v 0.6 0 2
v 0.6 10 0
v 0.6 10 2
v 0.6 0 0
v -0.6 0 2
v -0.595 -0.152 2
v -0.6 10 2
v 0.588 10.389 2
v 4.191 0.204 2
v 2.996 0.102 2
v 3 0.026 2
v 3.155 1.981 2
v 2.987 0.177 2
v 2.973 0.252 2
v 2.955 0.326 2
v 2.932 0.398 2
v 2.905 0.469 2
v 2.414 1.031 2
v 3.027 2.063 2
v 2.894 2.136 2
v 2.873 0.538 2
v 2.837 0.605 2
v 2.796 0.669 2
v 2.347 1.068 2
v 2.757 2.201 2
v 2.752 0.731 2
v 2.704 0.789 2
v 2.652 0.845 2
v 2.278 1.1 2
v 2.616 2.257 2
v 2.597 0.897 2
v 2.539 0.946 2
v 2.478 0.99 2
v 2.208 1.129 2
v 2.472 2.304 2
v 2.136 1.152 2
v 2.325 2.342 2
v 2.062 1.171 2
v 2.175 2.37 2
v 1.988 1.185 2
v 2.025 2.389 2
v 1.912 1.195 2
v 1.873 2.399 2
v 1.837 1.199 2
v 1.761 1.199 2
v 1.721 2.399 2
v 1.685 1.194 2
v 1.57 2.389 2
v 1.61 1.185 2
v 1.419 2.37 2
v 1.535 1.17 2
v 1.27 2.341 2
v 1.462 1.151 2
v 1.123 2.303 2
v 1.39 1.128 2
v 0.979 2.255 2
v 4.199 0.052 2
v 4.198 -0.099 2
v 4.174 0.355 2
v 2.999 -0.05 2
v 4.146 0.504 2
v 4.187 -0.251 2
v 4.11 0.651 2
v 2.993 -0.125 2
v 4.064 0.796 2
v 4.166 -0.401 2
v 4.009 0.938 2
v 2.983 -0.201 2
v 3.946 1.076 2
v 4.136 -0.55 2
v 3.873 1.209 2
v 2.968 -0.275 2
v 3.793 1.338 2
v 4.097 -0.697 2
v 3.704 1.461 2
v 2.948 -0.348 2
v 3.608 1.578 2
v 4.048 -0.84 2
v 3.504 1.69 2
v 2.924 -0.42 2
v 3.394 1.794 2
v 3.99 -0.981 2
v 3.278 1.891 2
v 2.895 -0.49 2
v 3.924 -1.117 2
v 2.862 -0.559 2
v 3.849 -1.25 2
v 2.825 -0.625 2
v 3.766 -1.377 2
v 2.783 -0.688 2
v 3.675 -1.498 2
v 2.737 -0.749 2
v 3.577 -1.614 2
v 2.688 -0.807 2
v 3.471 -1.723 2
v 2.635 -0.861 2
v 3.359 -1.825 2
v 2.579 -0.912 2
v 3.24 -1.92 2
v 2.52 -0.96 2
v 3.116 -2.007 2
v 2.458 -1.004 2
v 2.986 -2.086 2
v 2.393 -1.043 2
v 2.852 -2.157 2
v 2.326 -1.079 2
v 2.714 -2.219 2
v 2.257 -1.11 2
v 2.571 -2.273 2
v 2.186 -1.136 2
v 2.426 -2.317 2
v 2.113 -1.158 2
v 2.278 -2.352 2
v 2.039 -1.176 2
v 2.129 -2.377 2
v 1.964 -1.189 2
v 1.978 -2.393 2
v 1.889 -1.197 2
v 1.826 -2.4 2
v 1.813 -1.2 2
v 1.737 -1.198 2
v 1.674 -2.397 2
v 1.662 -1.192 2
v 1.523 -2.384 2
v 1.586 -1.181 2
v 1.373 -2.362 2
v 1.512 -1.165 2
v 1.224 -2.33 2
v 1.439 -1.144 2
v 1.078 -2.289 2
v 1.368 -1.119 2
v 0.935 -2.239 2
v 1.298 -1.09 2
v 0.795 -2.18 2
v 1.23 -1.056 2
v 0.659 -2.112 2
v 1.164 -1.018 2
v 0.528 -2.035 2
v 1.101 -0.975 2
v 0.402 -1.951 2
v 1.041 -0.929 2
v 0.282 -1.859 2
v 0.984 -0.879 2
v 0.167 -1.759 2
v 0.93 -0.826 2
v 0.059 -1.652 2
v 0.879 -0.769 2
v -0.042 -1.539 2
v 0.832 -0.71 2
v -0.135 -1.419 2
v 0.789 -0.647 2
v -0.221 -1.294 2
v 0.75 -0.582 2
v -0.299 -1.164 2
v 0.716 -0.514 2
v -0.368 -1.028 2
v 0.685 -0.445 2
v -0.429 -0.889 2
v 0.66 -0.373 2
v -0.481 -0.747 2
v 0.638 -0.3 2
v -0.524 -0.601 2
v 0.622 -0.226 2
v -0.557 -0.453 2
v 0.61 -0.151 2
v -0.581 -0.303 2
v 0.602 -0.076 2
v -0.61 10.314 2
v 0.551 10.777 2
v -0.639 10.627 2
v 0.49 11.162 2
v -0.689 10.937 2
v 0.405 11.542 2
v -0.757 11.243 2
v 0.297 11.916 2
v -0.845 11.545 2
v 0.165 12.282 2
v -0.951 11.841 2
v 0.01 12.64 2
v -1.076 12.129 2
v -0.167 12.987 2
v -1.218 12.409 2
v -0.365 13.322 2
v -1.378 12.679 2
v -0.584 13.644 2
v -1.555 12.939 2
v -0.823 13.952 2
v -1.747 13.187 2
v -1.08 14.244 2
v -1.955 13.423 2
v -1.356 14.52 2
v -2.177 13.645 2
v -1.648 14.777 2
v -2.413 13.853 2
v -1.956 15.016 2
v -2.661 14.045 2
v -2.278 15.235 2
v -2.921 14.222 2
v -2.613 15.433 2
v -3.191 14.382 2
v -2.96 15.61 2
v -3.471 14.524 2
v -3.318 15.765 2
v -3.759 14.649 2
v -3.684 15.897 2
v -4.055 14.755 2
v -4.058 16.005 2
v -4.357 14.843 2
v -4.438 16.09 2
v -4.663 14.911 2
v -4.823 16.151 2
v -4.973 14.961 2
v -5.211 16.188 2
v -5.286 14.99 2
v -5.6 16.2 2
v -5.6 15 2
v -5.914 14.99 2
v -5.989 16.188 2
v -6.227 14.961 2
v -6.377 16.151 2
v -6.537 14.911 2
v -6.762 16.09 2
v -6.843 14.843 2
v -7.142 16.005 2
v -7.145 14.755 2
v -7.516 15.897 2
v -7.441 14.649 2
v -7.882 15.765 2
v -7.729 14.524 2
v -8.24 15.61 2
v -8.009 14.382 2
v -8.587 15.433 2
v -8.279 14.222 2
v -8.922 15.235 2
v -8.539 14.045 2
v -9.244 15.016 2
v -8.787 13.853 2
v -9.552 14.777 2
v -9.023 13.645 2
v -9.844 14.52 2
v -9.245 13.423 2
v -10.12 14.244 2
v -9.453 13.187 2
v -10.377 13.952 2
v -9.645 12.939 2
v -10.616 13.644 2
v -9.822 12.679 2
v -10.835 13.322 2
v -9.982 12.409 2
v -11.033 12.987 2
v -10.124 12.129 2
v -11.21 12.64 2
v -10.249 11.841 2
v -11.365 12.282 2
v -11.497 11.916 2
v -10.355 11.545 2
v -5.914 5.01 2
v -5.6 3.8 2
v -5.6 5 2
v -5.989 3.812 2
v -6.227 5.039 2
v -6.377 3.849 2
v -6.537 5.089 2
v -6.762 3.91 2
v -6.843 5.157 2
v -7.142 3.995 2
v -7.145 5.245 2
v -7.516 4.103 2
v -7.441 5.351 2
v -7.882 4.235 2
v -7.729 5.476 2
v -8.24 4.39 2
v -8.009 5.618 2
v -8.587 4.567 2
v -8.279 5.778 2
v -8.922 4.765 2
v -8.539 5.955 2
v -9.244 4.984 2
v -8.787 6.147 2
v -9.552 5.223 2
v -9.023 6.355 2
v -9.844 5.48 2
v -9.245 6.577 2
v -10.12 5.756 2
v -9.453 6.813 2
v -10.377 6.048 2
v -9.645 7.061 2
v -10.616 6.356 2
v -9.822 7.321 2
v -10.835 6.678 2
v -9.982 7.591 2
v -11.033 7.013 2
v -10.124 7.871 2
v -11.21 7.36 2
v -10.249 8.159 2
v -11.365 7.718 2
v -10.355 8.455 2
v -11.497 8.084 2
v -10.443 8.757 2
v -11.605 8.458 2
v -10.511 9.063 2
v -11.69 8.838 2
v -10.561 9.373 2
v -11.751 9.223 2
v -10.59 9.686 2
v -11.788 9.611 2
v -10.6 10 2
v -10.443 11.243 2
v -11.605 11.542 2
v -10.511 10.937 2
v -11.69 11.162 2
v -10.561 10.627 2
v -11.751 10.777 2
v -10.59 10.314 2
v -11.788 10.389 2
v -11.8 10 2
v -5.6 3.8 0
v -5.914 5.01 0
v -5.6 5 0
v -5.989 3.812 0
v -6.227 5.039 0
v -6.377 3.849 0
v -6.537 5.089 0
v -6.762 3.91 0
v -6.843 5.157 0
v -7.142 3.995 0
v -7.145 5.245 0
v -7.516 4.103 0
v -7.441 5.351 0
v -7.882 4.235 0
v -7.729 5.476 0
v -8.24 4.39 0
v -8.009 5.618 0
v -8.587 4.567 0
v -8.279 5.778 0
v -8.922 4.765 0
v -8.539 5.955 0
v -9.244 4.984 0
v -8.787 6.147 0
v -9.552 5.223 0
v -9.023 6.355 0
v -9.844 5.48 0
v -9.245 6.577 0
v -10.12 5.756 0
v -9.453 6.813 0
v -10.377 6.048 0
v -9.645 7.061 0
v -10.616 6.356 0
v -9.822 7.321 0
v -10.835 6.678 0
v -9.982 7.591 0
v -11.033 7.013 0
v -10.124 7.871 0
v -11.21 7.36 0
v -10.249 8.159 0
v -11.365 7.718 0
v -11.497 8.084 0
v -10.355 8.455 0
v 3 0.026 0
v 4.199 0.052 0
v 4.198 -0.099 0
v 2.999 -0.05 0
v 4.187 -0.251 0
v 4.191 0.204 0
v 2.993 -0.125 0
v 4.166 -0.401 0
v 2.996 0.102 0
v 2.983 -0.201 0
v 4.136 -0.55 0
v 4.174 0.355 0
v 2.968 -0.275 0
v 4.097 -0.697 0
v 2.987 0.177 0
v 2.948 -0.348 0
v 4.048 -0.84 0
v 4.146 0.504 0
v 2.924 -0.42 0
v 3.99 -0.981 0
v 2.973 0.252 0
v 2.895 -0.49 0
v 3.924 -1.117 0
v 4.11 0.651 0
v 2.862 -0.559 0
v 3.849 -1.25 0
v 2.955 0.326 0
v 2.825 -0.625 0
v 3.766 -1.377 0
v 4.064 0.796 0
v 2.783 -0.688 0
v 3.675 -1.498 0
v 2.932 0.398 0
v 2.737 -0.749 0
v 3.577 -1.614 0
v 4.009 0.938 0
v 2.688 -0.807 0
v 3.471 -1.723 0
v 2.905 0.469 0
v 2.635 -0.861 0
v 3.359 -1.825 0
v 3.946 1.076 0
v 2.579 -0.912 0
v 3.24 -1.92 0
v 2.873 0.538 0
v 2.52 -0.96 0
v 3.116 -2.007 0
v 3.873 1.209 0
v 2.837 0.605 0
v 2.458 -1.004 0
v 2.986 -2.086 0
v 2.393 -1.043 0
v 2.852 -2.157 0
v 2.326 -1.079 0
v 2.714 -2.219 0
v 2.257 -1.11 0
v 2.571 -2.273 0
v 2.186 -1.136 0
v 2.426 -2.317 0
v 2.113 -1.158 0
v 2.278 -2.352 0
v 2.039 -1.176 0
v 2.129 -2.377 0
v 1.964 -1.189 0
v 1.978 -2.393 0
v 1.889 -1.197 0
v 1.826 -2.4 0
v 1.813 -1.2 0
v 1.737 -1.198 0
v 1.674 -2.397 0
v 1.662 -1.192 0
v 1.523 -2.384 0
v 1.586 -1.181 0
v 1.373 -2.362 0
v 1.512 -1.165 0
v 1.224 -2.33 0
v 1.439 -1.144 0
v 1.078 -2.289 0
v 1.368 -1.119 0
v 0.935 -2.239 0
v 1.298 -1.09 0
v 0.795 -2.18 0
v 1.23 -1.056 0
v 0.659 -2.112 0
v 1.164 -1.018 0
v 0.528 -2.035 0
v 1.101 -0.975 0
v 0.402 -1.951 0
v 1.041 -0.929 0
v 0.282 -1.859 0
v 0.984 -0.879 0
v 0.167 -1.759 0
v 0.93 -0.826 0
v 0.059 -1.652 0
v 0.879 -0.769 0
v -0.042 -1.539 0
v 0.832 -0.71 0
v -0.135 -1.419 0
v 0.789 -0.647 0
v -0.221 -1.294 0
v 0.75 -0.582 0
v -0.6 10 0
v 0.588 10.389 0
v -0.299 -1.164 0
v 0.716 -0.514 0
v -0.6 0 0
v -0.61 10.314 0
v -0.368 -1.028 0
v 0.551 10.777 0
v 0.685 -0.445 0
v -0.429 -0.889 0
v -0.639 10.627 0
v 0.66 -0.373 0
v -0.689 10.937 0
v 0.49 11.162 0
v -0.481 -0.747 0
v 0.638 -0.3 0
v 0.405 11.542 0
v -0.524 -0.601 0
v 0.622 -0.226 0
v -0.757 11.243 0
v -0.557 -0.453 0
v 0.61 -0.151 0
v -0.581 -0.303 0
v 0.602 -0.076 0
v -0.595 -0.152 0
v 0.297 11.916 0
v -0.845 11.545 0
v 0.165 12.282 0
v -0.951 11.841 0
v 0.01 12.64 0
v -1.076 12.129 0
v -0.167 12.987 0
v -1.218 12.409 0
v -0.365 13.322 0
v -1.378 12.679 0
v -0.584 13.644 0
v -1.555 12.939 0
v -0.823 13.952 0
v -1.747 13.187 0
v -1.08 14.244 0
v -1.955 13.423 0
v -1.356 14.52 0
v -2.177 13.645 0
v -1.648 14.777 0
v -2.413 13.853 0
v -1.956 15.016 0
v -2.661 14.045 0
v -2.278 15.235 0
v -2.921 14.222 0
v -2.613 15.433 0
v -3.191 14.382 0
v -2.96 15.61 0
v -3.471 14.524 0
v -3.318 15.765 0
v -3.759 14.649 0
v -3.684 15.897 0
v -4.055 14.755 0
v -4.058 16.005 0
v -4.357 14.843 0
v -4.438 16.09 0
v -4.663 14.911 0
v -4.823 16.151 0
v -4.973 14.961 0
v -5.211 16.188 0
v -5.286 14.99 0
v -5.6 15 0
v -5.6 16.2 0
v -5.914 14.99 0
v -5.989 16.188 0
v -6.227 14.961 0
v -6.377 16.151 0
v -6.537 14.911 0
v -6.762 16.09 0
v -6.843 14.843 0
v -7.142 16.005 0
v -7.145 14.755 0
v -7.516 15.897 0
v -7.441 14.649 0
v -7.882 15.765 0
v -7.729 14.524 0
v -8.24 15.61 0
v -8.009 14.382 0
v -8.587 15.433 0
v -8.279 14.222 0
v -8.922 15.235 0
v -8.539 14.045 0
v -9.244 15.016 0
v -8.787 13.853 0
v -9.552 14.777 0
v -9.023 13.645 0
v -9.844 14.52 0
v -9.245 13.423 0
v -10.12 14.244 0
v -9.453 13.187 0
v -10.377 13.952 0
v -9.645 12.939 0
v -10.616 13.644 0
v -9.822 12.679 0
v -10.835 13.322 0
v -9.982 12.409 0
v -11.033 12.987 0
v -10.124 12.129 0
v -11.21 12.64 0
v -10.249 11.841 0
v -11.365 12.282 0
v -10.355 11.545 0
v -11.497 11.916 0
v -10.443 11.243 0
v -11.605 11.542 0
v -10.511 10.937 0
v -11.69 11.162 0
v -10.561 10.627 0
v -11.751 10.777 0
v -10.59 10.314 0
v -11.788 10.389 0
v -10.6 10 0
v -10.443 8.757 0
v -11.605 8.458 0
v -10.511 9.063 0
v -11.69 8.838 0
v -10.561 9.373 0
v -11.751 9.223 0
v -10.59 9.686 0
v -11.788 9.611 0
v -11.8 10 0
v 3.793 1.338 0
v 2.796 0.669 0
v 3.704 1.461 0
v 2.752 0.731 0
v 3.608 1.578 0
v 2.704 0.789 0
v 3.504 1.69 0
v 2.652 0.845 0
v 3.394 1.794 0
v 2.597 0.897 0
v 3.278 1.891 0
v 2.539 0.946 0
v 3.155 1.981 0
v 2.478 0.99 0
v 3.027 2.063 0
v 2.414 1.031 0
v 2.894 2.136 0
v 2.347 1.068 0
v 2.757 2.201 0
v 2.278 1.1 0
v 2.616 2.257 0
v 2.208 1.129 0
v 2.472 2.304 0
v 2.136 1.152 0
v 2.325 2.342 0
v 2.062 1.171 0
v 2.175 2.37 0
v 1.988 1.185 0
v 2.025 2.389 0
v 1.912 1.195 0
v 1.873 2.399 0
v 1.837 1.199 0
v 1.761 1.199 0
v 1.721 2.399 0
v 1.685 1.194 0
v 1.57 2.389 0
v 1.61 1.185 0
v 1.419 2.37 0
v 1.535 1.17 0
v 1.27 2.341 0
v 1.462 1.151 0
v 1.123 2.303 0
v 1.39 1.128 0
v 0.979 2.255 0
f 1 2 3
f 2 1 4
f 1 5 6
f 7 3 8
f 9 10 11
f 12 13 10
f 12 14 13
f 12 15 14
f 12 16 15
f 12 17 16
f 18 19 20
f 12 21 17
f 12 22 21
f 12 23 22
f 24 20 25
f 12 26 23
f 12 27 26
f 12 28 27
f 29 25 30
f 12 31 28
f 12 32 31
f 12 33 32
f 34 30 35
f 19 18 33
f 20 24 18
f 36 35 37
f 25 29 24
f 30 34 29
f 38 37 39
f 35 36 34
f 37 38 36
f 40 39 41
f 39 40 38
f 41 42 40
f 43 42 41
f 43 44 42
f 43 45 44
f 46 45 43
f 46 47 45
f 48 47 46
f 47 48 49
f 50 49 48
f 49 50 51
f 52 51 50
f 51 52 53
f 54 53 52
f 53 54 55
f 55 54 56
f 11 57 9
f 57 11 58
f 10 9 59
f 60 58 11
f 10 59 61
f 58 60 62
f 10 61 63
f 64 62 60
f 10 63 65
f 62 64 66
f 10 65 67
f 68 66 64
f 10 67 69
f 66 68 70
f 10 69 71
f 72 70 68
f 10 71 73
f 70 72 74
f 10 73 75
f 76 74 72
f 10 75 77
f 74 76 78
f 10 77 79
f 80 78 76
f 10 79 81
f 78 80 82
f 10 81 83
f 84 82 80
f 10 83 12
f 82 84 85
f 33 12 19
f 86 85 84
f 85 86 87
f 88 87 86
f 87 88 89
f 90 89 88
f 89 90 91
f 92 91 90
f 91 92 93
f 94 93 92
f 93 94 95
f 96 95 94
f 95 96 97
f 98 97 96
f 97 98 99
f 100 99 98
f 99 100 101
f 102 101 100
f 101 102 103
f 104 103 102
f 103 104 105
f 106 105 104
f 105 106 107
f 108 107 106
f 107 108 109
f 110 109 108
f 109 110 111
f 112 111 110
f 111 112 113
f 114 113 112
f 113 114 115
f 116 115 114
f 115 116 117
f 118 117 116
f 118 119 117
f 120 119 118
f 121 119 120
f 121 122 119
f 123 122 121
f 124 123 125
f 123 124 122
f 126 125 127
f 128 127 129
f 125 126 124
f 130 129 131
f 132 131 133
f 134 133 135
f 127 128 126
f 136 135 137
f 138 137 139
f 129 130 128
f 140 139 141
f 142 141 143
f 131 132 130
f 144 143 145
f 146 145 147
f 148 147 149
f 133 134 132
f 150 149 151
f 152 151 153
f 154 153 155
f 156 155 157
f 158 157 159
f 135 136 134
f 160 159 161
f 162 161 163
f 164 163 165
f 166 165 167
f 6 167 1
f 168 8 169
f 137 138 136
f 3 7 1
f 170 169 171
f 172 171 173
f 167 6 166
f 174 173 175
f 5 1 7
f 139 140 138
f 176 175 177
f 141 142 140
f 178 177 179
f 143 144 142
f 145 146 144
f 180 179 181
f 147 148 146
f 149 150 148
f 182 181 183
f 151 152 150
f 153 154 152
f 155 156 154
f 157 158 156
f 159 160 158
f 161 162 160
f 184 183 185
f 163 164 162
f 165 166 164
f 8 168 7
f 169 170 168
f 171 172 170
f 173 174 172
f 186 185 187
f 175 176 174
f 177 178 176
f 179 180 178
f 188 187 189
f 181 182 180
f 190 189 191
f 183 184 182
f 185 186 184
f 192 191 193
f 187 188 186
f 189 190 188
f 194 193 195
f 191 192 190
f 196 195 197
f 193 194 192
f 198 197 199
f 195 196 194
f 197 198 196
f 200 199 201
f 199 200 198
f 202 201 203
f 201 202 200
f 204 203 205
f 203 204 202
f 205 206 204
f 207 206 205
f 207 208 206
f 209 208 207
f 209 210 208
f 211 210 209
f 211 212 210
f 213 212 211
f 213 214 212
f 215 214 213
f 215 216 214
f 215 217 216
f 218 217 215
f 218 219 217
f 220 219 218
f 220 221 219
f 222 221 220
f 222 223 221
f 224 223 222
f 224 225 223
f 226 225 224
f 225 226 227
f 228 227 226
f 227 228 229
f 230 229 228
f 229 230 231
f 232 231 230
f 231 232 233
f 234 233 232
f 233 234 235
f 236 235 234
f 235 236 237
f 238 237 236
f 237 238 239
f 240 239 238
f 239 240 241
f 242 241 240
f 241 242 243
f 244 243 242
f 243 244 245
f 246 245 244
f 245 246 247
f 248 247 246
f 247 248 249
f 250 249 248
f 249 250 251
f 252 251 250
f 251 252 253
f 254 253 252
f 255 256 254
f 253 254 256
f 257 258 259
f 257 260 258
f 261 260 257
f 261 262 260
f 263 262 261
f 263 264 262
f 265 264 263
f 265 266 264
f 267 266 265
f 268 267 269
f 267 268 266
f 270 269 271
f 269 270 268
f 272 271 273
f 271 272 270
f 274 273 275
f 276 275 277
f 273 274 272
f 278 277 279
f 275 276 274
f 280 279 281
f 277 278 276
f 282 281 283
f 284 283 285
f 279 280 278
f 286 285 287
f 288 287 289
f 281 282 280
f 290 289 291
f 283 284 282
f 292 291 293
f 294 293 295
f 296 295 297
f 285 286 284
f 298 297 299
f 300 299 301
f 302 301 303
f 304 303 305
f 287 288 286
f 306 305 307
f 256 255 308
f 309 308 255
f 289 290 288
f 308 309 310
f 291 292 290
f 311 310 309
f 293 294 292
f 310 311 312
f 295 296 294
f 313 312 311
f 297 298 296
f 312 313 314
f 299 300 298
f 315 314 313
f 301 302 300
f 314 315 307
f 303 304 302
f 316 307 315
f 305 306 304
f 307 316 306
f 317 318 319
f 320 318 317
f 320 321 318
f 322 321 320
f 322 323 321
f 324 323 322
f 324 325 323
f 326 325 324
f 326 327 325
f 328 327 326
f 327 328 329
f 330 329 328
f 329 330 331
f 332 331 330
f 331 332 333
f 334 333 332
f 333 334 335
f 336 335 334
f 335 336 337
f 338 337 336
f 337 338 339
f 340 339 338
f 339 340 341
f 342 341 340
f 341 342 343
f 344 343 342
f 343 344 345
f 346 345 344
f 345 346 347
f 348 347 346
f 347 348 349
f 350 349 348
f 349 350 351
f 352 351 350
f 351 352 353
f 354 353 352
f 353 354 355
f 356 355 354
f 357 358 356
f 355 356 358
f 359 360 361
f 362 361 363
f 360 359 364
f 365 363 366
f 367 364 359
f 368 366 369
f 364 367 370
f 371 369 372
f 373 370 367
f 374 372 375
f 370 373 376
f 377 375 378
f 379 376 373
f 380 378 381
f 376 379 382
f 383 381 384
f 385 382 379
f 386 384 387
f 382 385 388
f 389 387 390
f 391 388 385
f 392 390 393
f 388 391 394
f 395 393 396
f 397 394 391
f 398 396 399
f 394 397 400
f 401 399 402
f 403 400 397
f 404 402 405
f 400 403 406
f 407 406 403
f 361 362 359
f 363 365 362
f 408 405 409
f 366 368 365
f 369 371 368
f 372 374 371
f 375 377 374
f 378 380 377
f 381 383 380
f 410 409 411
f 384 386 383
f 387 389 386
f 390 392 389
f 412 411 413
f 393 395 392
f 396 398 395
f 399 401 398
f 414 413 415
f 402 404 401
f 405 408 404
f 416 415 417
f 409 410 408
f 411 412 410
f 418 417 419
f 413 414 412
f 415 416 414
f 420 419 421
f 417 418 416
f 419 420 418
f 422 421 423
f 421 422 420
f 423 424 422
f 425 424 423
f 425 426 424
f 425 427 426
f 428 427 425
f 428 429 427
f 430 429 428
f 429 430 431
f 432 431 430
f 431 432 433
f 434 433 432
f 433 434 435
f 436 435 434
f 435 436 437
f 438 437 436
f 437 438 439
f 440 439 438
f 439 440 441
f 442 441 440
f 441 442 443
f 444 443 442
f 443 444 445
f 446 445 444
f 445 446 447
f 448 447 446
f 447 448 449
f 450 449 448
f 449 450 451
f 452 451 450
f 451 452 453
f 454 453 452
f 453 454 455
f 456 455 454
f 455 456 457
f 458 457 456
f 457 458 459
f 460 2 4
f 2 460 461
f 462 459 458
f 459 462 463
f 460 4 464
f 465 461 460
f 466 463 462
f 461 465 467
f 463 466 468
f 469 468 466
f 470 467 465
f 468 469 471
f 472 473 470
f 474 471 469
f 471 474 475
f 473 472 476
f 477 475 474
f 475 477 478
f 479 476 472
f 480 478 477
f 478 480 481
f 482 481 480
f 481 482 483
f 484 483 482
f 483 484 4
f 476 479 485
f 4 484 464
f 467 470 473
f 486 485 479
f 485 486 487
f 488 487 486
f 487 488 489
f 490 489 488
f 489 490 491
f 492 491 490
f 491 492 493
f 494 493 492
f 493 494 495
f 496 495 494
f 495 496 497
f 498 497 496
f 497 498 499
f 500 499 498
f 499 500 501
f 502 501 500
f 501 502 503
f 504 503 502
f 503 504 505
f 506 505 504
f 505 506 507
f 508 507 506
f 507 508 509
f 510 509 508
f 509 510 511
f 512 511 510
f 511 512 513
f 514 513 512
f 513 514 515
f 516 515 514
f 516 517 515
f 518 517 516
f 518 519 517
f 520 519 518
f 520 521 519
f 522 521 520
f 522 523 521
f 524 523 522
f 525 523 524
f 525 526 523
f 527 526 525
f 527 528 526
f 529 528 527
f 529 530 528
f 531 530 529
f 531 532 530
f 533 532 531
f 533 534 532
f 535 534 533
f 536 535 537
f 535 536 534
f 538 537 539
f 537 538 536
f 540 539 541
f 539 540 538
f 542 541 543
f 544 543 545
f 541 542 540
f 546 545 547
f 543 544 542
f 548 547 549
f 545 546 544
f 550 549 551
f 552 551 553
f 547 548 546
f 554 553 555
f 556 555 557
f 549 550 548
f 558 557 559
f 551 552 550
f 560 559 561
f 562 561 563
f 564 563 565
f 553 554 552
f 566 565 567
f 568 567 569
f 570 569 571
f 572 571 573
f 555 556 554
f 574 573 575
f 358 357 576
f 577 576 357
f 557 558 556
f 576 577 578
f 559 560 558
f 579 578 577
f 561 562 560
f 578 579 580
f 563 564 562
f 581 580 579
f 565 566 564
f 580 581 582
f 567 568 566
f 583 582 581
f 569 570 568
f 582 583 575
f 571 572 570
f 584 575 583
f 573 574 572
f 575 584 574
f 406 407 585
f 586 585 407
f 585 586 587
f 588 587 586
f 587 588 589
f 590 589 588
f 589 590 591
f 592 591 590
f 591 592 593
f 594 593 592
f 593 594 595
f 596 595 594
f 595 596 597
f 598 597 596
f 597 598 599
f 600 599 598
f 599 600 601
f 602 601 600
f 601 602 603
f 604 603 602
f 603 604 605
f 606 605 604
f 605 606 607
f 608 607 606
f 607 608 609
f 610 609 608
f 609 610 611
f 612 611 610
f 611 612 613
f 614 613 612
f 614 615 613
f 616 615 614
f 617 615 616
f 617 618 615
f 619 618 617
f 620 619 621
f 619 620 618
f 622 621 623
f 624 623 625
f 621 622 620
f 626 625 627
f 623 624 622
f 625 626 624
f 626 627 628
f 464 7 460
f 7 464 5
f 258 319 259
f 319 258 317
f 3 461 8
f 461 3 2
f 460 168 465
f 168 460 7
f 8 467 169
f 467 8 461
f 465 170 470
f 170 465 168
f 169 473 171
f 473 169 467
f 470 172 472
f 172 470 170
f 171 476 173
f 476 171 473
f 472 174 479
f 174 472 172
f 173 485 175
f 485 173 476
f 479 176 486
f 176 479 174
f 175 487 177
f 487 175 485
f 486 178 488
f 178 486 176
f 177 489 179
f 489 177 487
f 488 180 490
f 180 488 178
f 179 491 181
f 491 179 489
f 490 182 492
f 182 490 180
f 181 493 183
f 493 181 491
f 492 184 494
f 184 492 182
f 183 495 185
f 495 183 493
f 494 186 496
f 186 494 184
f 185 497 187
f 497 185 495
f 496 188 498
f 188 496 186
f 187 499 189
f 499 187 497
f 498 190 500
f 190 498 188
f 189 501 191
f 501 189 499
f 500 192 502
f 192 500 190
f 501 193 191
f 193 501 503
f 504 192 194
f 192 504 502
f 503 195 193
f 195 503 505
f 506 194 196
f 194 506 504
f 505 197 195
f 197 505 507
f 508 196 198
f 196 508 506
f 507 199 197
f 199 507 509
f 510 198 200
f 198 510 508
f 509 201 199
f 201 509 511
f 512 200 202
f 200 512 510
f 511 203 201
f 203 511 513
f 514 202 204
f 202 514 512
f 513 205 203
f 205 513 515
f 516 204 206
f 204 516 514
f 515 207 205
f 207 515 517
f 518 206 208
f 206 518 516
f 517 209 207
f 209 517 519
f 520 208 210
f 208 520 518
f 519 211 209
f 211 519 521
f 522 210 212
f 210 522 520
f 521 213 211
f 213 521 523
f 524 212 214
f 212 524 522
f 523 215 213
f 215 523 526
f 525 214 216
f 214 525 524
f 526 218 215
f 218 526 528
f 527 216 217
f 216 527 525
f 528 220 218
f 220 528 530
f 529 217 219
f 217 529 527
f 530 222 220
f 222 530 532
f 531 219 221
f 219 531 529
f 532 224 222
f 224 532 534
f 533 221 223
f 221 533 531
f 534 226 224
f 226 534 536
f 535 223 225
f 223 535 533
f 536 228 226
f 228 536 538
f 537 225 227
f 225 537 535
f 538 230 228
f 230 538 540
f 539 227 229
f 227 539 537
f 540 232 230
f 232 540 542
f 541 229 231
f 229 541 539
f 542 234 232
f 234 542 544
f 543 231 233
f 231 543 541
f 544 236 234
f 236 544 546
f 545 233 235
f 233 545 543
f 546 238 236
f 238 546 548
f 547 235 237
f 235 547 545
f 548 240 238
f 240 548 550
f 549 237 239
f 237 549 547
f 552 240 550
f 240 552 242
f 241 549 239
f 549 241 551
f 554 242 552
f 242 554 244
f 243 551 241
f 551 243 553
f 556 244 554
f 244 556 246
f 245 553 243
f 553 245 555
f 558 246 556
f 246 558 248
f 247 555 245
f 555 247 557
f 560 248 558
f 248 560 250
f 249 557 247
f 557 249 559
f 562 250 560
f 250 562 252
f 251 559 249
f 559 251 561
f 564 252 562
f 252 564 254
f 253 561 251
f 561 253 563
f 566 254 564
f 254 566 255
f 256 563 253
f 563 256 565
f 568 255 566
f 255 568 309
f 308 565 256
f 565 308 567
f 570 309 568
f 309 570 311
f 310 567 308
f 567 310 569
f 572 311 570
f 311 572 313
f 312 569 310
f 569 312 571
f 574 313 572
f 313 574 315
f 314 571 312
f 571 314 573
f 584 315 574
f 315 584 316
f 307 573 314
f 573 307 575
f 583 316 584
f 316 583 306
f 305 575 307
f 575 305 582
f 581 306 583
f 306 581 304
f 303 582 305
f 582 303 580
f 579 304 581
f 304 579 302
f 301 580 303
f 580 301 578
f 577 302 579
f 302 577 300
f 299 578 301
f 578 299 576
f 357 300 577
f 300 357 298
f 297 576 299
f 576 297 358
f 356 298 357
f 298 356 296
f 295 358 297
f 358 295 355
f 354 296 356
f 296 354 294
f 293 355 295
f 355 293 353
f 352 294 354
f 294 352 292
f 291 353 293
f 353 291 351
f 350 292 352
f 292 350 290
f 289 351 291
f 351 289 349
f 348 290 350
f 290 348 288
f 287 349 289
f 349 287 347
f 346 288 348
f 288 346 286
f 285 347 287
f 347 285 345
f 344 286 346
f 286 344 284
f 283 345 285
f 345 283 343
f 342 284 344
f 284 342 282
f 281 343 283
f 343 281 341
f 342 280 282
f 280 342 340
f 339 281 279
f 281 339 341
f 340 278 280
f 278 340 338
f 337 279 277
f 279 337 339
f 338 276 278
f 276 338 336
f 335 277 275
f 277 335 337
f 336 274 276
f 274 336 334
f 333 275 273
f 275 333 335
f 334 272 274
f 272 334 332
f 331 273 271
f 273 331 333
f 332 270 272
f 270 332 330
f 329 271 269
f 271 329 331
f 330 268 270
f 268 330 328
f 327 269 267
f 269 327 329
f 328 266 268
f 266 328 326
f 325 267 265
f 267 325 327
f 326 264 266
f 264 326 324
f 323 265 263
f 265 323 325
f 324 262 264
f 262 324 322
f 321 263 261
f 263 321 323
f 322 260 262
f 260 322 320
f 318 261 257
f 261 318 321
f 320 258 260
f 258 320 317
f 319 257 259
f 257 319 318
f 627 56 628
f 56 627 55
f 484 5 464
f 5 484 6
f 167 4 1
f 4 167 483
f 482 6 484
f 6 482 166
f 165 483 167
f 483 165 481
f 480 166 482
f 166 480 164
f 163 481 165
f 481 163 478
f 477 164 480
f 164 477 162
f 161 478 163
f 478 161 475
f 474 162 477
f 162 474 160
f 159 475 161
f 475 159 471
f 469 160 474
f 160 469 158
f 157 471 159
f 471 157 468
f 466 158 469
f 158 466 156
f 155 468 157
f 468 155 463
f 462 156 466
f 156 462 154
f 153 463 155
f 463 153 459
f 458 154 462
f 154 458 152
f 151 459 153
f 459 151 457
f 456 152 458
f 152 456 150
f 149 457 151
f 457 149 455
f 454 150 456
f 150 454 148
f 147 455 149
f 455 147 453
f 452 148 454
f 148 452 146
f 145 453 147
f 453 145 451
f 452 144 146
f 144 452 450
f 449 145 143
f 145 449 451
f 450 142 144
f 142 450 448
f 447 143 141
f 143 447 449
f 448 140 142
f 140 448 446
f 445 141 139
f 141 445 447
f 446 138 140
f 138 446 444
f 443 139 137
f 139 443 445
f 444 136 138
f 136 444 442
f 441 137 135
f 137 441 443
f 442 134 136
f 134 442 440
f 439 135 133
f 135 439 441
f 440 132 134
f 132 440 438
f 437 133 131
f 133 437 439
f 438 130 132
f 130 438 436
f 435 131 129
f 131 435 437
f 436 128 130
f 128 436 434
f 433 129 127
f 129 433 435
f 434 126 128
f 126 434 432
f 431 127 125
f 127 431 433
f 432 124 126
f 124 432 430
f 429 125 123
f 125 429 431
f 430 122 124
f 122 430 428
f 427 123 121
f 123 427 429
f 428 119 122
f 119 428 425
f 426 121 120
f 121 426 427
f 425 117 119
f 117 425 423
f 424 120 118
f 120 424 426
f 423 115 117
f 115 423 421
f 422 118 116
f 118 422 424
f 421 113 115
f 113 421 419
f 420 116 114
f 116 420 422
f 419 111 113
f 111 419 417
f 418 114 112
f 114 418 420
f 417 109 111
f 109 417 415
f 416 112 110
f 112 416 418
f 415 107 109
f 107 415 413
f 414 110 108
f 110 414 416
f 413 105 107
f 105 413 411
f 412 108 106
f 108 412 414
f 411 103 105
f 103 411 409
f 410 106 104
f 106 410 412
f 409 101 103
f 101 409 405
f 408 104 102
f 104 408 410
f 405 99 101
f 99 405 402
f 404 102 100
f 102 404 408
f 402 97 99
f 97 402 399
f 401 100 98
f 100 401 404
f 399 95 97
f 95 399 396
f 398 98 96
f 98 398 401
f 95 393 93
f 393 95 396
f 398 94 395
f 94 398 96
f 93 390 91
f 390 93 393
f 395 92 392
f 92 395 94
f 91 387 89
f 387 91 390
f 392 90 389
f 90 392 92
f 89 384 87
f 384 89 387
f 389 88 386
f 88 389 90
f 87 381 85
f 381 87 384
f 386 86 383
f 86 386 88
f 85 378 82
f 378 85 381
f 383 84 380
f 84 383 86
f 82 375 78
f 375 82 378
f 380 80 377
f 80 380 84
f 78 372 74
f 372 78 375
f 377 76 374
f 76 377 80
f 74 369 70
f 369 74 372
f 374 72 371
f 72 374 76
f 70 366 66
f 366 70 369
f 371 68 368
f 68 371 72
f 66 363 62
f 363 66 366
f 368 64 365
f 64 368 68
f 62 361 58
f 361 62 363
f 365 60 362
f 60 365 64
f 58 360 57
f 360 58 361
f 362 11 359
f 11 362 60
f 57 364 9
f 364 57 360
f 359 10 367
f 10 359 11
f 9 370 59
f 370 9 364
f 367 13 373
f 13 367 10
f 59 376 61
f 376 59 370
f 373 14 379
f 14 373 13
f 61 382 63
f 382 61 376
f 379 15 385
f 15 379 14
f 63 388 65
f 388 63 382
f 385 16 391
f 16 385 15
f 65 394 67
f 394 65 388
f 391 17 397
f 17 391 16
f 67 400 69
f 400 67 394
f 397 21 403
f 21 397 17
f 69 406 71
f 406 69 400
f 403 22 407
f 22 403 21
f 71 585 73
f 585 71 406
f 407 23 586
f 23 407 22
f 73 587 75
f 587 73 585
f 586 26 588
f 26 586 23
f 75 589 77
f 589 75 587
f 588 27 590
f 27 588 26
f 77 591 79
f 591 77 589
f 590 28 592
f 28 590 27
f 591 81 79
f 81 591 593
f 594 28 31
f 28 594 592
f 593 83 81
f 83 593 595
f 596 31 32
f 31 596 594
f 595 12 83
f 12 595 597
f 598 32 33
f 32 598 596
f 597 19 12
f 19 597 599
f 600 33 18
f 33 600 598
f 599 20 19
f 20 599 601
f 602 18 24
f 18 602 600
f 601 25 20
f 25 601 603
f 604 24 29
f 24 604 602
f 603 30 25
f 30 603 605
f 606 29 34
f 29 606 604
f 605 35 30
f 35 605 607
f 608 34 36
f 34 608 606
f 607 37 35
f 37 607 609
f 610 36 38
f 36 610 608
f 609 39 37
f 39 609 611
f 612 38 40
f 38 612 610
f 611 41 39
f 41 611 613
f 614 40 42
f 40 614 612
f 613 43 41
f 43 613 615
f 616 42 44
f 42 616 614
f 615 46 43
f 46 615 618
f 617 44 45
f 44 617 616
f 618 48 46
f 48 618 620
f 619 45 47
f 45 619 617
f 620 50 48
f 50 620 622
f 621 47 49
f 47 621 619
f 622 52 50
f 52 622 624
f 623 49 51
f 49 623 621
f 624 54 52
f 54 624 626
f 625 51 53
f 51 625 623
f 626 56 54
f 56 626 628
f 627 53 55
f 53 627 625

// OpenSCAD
// detail level (100=very fine)
$fn=100; 

// the width of the hook (on the build plate)
width = 1.2;

// the height of the hook (on the build plate)
height = 2;

// the length of the straight part
length = 10.0;

// the inside radius of the top part
top_radius = 1.2;

// covered angle of the top part (0 degree is where the straight part ends)
top_angle = 290;

// the inside radius of the bottom part
bottom_radius = 5.0  ;

// covered angle of the bottom part (0 degree is where the straight part ends)
bottom_angle = 270; // 

union() {
    
    translate([-width/2, 0, 0])
        cube([width,length,height]);

    translate([-bottom_radius-width/2, length, 0])
        rotate_extrude(convexity = 10, angle=bottom_angle)
            translate([bottom_radius, 0, 0])
                square([width, height]);


    translate([top_radius+width/2, 0, 0])
    rotate([0,0,180])
        rotate_extrude(convexity = 10, angle=top_angle)
            translate([top_radius, 0, 0])
            square([width, height]);
}
